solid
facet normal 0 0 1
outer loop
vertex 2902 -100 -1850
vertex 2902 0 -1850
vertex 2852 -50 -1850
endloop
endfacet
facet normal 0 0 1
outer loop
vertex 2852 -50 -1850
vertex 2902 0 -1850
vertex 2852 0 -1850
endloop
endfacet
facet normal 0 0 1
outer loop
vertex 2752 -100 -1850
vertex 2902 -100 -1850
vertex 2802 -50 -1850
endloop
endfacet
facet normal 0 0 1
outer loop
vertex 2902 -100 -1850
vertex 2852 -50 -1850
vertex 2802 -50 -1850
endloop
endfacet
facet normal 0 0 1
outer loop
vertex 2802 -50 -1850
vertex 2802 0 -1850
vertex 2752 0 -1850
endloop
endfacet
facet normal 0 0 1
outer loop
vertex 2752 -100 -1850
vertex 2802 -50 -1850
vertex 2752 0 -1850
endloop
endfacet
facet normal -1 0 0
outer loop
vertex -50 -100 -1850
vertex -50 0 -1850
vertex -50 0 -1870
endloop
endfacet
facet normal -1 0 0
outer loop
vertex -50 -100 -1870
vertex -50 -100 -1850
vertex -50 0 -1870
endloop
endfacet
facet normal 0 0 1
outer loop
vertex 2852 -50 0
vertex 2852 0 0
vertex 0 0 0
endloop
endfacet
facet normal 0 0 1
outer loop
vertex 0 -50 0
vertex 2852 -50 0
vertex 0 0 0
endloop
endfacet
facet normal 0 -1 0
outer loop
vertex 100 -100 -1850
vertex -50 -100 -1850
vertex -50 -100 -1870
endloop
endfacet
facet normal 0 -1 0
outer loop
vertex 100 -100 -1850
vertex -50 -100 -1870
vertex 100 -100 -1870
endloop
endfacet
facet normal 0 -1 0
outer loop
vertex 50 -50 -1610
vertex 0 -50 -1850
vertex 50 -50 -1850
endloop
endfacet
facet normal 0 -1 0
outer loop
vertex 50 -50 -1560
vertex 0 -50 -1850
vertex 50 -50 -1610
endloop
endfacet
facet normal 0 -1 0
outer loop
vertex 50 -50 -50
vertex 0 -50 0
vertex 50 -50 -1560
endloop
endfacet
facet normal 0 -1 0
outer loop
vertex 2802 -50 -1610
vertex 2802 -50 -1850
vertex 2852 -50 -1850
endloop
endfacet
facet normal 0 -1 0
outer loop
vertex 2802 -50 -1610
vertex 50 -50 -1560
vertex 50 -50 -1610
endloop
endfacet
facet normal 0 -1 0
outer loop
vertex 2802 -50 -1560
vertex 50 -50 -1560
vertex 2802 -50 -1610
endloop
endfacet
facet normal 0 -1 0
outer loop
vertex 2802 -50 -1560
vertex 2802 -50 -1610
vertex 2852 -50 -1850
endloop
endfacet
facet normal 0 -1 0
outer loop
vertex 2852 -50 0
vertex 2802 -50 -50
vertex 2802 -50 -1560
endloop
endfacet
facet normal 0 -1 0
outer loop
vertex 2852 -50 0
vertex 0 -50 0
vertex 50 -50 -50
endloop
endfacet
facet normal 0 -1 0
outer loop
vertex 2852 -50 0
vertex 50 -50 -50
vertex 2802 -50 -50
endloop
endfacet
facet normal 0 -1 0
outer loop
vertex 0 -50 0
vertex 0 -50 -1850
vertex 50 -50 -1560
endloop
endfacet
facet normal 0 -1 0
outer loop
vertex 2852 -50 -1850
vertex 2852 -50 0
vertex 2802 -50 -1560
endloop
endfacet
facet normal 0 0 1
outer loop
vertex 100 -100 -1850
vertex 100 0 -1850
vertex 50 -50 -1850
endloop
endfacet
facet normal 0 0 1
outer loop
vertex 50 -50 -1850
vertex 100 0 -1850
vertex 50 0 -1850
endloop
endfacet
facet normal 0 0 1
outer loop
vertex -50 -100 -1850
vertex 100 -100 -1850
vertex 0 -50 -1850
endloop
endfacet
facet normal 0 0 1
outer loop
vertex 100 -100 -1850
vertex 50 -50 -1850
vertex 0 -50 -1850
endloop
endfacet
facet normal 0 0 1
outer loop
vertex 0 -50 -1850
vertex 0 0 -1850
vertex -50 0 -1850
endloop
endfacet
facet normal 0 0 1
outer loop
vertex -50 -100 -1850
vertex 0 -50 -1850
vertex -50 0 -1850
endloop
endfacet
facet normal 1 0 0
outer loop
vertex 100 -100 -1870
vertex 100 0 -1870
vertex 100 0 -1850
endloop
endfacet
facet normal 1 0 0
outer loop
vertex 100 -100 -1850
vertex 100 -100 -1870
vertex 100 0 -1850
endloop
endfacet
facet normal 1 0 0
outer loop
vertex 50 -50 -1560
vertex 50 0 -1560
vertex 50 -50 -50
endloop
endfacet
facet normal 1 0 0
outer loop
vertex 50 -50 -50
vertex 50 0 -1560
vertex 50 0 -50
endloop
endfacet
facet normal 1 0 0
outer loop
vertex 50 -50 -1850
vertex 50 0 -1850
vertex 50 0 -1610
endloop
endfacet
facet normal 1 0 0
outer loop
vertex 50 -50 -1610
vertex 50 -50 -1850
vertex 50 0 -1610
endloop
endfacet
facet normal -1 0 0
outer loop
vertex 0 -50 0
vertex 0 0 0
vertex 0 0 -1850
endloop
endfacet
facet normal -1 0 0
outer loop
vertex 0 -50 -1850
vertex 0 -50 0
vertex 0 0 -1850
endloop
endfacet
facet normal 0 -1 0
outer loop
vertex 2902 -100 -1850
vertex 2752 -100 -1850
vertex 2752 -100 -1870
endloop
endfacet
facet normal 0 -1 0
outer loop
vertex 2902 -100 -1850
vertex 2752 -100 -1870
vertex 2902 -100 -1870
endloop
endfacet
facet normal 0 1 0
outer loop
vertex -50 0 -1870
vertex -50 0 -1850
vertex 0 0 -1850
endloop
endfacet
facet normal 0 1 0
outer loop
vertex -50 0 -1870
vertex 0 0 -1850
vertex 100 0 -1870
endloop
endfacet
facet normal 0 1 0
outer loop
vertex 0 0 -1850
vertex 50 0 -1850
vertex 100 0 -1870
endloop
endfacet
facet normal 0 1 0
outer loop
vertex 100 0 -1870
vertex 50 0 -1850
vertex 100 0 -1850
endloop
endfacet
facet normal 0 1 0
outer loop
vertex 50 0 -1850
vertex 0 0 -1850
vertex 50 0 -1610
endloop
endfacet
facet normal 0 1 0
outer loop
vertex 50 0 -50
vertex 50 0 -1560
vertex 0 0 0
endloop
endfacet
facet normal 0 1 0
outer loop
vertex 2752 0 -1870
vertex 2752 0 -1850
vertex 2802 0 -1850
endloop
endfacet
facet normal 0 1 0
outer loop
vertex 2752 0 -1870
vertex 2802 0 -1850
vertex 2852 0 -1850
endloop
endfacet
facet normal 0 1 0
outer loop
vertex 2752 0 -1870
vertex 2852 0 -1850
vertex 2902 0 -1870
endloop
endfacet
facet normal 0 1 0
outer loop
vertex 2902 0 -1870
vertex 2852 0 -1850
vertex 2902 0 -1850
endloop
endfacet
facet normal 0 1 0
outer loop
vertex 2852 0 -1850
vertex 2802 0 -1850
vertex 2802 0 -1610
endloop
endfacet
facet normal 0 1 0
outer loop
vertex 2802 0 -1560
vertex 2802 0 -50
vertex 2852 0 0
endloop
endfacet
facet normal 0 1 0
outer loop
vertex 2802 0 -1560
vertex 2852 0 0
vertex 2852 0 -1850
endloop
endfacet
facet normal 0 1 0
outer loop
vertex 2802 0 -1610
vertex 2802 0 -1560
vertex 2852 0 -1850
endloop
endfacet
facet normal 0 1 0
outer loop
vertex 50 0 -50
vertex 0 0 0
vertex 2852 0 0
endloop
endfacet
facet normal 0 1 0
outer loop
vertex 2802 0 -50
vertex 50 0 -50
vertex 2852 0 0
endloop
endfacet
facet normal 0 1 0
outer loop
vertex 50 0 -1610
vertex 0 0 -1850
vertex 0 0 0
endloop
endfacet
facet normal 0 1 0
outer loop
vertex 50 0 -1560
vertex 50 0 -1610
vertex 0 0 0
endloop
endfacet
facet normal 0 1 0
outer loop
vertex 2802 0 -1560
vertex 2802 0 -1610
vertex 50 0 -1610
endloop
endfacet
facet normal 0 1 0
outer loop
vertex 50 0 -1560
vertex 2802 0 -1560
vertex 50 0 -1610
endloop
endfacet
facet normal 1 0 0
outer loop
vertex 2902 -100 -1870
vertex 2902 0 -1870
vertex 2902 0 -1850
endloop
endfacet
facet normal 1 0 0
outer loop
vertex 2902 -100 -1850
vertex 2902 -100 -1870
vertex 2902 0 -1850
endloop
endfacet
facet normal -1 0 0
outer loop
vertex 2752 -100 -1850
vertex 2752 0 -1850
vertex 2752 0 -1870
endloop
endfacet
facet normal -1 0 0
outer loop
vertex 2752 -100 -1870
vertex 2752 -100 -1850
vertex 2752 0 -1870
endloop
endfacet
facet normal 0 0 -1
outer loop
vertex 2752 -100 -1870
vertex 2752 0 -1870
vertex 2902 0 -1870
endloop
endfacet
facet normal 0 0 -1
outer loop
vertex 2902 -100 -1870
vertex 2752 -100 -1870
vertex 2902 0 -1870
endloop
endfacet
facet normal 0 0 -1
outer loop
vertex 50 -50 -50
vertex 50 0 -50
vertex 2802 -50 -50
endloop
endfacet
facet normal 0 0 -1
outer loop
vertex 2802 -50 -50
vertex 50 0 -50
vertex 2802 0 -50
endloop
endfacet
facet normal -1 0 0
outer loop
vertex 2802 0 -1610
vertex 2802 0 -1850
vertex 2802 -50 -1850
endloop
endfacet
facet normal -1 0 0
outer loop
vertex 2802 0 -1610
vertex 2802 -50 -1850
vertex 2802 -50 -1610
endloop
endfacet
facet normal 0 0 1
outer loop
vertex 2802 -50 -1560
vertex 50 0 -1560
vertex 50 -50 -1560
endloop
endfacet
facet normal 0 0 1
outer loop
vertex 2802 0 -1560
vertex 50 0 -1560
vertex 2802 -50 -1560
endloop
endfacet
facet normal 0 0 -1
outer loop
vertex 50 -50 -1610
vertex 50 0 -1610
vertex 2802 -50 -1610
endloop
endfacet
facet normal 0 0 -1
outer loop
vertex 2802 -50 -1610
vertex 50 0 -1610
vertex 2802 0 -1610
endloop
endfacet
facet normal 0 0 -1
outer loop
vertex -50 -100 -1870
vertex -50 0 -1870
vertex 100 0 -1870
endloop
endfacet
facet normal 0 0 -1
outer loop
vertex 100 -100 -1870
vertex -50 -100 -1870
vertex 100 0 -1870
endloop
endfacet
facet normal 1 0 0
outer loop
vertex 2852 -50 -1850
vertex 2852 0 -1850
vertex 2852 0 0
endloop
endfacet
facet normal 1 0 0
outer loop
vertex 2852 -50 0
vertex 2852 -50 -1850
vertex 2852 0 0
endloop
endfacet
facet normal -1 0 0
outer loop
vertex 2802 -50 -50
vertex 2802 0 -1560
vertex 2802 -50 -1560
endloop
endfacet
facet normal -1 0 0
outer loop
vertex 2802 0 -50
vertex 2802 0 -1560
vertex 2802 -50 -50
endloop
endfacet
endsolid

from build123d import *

# Parameters (mm, degrees)
F0_W     = 2752
F0_H     = 1510
F0_W_2   = 50
F0_H_2   = 240
F1_DEPTH = 50
F2_DEPTH = 100
F3_DEPTH = 100


with BuildPart() as f1:
    # F0 (on Front) → F1 (new body)
    with BuildSketch(Plane.XZ):
        Polygon((2852, 0), (0, 0), (0, -1610), (50, -1610), (2802, -1610), (2852, -1610), align=None)
        with Locations((1426, -805)):
            Rectangle(F0_W, F0_H, mode=Mode.SUBTRACT)
        with Locations((25, -1730)):
            Rectangle(F0_W_2, F0_H_2)
        with Locations((2827, -1730)):
            Rectangle(F0_W_2, F0_H_2)
    extrude(amount=F1_DEPTH)

    # F0 (on Front) → F2 (join)
    with BuildSketch(Plane.XZ):
        Polygon((50, -1850), (0, -1850), (-50, -1850), (-50, -1870), (100, -1870), (100, -1850), align=None)
    extrude(amount=F2_DEPTH)

    # F0 (on Front) → F3 (join)
    with BuildSketch(Plane.XZ):
        Polygon((2902, -1850), (2852, -1850), (2802, -1850), (2752, -1850), (2752, -1870), (2902, -1870), align=None)
    extrude(amount=F3_DEPTH)


solid = f1.part
